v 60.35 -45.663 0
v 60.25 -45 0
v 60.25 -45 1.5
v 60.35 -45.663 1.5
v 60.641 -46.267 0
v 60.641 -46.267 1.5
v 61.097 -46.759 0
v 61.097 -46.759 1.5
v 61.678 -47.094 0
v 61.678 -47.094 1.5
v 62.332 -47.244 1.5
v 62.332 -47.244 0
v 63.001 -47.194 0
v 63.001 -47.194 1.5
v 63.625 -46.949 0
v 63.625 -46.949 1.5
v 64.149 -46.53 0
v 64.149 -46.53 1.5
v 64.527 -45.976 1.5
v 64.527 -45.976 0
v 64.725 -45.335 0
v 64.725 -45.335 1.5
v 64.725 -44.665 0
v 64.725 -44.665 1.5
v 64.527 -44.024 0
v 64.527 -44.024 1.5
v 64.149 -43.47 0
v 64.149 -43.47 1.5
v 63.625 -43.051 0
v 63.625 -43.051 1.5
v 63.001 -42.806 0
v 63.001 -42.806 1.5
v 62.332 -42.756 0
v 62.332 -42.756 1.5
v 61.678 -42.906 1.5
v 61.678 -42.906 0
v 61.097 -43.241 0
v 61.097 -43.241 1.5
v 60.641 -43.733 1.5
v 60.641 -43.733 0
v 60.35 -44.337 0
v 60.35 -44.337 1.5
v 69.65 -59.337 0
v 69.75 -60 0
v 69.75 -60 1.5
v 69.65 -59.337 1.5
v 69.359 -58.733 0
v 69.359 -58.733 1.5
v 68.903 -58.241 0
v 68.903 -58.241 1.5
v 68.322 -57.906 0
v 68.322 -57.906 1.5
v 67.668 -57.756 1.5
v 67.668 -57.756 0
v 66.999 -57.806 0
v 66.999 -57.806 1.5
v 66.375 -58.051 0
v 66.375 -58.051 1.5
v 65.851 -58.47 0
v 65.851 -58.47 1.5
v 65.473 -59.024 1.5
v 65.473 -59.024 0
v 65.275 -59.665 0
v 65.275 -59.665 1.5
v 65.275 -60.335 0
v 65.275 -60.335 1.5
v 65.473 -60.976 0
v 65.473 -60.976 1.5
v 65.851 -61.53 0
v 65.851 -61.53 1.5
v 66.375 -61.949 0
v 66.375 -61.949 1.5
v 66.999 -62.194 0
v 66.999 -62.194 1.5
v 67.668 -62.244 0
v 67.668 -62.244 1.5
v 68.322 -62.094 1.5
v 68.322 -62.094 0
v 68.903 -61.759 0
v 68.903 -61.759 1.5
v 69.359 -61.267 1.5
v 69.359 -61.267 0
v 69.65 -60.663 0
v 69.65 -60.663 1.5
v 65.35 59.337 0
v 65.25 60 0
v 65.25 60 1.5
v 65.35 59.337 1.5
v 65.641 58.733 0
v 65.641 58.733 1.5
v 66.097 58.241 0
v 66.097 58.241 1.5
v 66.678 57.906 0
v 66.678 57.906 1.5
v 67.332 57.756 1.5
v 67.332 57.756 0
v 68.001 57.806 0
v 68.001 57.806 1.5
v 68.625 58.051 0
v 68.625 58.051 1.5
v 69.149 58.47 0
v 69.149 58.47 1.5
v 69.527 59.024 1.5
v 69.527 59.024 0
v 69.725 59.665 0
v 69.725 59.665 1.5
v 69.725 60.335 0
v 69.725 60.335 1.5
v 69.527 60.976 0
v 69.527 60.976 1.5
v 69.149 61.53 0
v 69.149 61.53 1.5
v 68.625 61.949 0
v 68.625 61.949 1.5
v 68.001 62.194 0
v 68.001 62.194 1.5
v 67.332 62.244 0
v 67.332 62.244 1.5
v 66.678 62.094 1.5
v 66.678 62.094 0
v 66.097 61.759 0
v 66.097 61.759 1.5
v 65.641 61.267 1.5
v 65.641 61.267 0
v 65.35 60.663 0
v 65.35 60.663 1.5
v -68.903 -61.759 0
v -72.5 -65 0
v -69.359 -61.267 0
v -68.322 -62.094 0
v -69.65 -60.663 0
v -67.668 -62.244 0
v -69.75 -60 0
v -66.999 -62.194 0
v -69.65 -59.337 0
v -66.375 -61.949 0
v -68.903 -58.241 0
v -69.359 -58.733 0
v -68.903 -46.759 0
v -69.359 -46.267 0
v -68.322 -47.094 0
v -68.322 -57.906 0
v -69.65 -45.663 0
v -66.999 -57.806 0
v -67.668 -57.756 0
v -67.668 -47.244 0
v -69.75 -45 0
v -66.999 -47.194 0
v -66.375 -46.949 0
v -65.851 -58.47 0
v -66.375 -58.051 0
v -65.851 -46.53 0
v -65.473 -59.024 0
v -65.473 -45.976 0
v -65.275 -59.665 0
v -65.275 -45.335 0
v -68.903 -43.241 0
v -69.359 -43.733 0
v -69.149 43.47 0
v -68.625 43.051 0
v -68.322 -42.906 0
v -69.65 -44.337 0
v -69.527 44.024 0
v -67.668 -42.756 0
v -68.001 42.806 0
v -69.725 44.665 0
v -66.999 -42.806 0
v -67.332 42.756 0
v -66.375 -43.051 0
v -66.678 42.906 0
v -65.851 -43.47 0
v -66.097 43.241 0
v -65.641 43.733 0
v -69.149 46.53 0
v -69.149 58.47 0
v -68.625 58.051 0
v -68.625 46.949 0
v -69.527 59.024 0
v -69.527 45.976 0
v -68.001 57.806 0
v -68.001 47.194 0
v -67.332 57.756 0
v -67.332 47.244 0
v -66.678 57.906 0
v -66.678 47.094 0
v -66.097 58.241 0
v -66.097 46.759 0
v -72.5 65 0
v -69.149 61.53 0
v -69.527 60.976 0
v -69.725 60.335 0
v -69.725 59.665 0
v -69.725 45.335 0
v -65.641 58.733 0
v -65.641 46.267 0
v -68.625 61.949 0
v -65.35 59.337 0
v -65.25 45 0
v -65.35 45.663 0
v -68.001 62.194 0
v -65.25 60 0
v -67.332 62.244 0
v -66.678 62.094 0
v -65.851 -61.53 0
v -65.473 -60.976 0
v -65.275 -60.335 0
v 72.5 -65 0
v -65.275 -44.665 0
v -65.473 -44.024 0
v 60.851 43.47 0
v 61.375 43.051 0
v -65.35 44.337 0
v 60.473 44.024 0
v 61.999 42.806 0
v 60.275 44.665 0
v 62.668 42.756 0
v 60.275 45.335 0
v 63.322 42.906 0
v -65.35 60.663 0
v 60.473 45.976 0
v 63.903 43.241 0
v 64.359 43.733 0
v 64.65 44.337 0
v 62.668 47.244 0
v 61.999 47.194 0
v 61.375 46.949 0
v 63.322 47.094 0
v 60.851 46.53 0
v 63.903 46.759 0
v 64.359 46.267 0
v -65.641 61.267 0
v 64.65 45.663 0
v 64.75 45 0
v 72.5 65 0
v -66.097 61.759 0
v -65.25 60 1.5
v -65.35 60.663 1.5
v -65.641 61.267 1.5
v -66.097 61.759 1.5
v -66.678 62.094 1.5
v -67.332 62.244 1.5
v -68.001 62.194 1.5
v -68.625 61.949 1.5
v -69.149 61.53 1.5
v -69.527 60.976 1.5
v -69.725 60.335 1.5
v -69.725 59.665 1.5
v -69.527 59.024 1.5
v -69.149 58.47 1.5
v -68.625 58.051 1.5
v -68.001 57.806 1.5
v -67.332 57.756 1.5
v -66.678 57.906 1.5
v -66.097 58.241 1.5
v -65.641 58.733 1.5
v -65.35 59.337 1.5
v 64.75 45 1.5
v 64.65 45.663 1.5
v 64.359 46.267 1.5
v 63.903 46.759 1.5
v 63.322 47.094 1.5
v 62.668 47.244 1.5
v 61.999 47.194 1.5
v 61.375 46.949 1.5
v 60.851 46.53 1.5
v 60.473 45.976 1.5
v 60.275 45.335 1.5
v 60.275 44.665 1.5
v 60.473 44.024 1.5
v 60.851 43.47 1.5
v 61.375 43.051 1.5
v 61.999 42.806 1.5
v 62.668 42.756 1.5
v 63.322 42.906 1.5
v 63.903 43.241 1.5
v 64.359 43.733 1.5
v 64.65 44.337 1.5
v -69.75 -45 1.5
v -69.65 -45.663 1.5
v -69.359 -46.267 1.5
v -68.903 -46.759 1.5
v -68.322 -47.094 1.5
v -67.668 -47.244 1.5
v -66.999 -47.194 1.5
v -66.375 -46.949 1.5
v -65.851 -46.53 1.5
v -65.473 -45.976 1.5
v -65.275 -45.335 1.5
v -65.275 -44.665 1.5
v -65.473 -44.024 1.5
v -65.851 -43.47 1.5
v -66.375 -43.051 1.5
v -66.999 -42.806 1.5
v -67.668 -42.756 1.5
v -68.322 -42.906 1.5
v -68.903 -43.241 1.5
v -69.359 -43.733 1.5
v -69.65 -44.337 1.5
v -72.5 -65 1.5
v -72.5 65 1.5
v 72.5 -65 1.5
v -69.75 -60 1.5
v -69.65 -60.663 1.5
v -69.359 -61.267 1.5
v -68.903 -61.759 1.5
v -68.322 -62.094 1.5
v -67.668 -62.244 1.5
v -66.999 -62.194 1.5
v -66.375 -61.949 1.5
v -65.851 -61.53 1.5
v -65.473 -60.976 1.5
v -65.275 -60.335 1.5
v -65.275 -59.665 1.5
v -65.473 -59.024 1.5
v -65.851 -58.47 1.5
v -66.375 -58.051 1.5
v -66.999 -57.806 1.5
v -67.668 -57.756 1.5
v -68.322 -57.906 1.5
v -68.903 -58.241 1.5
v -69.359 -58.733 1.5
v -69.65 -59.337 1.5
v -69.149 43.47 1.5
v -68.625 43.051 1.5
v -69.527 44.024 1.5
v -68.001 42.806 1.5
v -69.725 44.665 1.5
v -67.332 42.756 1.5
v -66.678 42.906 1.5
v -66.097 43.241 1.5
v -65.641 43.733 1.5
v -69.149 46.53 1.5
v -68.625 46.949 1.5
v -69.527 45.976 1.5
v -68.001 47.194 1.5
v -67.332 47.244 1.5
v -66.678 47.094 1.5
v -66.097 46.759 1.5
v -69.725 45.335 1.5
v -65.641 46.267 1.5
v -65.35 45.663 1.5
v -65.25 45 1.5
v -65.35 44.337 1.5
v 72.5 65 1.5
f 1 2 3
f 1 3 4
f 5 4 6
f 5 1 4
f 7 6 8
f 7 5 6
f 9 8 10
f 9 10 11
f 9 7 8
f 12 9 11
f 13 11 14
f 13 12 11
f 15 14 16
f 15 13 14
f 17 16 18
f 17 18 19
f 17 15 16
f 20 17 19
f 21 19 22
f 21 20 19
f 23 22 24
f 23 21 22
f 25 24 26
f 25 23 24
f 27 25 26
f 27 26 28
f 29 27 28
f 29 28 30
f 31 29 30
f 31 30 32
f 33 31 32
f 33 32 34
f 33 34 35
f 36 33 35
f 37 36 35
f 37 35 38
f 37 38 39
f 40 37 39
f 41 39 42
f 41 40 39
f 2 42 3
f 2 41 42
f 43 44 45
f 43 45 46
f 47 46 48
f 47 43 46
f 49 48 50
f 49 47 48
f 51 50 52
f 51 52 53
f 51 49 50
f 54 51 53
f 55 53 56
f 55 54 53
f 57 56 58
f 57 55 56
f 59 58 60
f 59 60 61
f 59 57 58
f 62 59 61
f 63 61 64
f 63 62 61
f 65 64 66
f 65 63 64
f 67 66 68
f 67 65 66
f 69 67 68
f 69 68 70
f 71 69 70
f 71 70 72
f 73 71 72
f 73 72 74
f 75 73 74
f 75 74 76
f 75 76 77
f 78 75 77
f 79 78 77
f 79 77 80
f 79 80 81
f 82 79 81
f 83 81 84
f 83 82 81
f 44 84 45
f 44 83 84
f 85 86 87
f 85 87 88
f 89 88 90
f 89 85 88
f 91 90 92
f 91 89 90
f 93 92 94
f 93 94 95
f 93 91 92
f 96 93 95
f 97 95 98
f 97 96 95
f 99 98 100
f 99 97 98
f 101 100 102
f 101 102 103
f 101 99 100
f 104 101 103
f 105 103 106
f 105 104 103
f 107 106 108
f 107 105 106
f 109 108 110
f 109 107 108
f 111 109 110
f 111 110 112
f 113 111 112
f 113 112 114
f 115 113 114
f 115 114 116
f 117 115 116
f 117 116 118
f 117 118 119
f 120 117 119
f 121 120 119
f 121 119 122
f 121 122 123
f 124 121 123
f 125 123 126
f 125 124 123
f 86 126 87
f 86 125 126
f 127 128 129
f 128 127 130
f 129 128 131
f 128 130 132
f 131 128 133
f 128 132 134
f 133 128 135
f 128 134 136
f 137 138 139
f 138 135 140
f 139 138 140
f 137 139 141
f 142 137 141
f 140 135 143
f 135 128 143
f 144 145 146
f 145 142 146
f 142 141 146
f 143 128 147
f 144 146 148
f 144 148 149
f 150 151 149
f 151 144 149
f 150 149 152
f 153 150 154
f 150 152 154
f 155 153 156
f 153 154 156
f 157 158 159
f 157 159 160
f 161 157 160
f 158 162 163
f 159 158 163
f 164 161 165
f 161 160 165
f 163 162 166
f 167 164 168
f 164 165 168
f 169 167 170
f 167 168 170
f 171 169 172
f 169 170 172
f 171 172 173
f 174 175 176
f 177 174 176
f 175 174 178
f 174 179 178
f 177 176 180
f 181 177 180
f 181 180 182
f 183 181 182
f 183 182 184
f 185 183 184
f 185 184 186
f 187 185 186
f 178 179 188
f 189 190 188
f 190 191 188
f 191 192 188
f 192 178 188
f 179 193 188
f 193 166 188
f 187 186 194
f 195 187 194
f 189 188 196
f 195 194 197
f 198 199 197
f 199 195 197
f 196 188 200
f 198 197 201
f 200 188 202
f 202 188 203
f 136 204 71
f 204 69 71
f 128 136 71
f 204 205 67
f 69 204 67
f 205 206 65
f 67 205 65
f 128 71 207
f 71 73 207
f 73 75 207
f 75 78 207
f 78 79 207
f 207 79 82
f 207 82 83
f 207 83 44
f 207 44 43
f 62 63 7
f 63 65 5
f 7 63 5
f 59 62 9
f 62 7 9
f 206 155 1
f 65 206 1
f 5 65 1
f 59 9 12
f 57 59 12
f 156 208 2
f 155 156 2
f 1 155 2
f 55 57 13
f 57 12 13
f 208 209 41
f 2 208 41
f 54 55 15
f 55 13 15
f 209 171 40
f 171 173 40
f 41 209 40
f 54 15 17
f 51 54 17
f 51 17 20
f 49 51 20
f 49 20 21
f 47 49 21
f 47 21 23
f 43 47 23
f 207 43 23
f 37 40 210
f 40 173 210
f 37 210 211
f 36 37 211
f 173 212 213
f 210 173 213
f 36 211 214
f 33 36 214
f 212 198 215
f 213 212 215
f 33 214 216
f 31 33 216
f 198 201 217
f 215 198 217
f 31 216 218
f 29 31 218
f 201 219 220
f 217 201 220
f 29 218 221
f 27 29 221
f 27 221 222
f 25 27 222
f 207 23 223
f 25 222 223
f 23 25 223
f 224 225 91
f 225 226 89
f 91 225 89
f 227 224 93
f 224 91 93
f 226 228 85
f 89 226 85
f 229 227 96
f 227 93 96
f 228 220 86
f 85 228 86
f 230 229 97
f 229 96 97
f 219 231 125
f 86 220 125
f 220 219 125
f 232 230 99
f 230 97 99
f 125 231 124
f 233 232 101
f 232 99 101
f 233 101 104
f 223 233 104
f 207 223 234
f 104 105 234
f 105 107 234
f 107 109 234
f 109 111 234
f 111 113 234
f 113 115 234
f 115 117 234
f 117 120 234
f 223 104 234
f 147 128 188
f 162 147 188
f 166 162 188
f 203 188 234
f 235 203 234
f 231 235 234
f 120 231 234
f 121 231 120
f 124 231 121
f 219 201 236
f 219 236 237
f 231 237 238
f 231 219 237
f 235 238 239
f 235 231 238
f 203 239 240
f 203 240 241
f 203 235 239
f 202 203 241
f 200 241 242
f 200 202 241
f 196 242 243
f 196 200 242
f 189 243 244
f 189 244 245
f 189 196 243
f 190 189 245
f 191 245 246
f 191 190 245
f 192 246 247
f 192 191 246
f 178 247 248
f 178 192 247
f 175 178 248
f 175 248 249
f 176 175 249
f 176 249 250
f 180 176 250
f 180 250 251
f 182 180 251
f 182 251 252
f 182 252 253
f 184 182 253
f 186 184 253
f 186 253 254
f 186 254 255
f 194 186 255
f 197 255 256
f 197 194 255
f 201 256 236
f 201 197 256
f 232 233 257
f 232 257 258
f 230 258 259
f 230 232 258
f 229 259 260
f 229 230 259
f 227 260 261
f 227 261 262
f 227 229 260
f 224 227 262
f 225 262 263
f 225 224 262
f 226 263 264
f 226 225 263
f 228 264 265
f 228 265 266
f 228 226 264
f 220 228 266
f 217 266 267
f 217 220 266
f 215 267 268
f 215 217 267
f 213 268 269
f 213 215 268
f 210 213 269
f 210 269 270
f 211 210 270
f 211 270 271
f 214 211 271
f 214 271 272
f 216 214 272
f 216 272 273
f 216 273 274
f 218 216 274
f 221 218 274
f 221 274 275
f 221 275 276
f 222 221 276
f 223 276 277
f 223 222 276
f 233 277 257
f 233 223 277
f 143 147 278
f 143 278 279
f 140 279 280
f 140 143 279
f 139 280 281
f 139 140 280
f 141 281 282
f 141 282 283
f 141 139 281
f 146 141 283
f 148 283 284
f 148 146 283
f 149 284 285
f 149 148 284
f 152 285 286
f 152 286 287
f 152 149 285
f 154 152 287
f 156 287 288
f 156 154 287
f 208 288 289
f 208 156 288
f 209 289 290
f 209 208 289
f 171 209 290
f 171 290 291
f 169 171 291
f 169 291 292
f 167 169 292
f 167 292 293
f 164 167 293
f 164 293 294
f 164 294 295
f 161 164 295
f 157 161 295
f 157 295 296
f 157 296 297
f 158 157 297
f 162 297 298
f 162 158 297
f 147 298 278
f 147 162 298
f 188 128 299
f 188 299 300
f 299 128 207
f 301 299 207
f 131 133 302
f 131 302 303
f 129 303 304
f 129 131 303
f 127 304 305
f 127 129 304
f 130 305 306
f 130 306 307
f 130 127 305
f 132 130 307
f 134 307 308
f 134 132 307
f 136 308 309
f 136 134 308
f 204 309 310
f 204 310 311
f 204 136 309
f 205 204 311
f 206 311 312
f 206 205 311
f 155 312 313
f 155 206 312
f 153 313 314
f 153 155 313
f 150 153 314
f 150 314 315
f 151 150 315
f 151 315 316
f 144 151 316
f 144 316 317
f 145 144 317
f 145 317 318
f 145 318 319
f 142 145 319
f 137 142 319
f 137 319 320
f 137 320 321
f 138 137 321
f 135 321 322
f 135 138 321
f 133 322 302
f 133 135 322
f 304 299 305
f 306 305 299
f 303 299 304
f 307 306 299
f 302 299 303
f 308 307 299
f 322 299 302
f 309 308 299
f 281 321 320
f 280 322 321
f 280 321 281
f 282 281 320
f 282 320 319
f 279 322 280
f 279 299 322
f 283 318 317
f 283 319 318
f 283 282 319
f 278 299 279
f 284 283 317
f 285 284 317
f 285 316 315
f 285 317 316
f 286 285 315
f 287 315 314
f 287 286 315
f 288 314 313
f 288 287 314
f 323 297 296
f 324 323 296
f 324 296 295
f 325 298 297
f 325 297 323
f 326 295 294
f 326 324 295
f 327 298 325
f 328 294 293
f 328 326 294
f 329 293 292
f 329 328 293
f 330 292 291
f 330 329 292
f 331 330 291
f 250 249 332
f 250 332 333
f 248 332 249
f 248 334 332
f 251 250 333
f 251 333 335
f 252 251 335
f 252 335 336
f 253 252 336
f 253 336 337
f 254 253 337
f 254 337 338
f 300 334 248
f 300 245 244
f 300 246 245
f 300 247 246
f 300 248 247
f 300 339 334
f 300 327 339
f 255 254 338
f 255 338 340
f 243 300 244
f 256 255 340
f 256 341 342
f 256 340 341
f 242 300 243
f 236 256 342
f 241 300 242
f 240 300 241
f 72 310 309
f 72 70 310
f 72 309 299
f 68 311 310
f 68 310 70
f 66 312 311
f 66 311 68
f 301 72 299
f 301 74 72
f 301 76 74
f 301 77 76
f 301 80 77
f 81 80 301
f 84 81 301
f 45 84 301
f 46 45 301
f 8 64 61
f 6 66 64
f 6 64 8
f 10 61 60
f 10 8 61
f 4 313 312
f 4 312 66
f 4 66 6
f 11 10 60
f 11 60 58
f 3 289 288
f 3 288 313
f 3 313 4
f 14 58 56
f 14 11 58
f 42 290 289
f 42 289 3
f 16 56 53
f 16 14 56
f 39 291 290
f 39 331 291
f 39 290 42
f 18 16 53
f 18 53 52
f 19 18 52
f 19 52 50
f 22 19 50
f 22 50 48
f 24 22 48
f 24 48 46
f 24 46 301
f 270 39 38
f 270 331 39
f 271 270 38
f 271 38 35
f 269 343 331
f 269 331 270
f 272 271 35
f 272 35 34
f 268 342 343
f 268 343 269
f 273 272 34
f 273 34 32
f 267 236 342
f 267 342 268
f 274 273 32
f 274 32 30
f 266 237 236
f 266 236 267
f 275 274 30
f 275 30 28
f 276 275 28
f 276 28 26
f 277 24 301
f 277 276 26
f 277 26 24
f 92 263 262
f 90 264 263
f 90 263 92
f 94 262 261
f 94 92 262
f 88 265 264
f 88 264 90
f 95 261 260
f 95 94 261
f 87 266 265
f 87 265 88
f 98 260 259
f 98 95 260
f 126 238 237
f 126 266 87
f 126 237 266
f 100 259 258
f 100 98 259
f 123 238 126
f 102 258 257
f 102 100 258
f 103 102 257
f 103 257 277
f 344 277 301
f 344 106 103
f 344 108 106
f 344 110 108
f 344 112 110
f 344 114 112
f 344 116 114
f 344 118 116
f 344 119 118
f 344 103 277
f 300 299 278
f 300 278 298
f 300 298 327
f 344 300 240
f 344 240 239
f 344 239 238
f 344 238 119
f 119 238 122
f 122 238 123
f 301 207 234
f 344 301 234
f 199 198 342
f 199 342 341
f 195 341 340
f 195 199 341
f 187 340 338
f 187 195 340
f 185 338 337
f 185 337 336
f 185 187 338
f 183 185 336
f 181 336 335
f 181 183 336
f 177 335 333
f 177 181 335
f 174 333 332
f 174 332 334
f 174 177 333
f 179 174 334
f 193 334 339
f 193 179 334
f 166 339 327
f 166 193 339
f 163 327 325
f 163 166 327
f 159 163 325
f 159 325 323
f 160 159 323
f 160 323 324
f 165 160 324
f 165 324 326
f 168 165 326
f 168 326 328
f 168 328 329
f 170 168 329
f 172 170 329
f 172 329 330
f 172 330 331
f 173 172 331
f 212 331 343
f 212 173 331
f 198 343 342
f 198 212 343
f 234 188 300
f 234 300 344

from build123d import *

# Parameters (mm, degrees)
SKETCH_1_W      = 145
SKETCH_1_H      = 130
SKETCH_1_R      = 2.25
EXTRUDE_1_DEPTH = 1.5


with BuildPart() as part:
    # Эскиз1 → Вытянуть1 (new body)
    with BuildSketch(Plane.XY):
        Rectangle(SKETCH_1_W, SKETCH_1_H)
        with Locations((-67.5, 60)):
            Circle(SKETCH_1_R, mode=Mode.SUBTRACT)
        with Locations(Location((-67.5, -60, 0), (0, 0, 180))):
            Circle(SKETCH_1_R, mode=Mode.SUBTRACT)
        with Locations((67.5, -60)):
            Circle(SKETCH_1_R, mode=Mode.SUBTRACT)
        with Locations(Location((67.5, 60, 0), (0, 0, 180))):
            Circle(SKETCH_1_R, mode=Mode.SUBTRACT)
        with Locations((-67.5, 45)):
            Circle(SKETCH_1_R, mode=Mode.SUBTRACT)
        with Locations(Location((-67.5, -45, 0), (0, 0, 180))):
            Circle(SKETCH_1_R, mode=Mode.SUBTRACT)
        with Locations((62.5, 45)):
            Circle(SKETCH_1_R, mode=Mode.SUBTRACT)
        with Locations(Location((62.5, -45, 0), (0, 0, 180))):
            Circle(SKETCH_1_R, mode=Mode.SUBTRACT)
    extrude(amount=EXTRUDE_1_DEPTH)


solid = part.part
